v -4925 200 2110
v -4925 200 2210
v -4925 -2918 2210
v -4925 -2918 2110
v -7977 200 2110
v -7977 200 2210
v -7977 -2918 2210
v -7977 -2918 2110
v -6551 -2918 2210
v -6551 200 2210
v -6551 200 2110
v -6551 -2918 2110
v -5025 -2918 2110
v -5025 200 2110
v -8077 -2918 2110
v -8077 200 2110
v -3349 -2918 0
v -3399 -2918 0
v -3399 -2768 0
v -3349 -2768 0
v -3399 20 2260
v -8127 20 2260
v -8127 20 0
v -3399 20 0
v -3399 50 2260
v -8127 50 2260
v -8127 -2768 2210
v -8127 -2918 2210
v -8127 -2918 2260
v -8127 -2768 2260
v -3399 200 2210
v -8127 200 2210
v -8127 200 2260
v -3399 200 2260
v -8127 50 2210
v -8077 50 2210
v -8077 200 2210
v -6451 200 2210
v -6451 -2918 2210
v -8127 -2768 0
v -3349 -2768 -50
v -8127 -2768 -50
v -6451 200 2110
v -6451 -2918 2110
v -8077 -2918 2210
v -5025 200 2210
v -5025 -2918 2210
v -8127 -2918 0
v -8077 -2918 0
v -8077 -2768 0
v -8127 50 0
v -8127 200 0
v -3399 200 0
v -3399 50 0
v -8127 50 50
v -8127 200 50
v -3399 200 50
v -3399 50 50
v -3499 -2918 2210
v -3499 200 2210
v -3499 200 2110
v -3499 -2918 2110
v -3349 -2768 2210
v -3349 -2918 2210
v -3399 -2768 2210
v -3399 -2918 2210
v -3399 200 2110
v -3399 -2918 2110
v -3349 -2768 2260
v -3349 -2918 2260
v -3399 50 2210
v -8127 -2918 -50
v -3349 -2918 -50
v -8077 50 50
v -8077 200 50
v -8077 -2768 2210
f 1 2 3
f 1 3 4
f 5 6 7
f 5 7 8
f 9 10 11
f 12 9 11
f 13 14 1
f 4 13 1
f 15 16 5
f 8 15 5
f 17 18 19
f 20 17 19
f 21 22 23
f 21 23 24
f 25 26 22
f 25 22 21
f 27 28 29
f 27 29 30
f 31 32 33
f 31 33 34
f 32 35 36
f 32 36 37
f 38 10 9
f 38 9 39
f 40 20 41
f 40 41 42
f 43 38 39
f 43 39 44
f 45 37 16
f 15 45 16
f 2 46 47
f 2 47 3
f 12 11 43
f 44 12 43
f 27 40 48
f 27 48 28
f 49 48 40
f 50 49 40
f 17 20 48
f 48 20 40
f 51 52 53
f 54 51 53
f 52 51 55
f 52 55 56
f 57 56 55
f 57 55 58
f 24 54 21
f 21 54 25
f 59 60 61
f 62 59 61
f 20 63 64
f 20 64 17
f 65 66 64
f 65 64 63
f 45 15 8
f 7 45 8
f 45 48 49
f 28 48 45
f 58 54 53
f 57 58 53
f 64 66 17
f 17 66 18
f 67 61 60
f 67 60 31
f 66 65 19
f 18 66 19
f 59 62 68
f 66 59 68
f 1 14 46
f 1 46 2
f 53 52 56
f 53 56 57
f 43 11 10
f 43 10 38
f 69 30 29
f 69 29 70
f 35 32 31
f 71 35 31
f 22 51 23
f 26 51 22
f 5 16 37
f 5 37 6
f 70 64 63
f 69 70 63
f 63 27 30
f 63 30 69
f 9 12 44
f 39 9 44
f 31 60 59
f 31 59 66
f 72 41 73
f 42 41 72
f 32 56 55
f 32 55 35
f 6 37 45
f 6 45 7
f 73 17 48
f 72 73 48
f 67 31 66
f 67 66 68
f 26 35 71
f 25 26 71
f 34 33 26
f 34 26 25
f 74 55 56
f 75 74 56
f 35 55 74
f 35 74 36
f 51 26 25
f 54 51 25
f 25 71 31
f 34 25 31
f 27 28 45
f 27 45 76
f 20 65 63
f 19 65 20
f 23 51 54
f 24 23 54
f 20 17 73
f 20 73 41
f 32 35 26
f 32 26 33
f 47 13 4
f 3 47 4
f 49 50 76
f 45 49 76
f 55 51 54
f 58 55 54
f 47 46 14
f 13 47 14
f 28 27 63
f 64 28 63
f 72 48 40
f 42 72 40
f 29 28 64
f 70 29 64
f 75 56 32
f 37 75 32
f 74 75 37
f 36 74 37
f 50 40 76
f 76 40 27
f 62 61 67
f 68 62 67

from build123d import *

# Parameters (mm, degrees)
SKETCH_1_W        = 4728
SKETCH_1_H        = 150
EXTRUDE_1_DEPTH   = 50
EXTRUDE_START     = 2210
SKETCH_1_3_W      = 4728
SKETCH_1_3_H      = 150
EXTRUDE_2_DEPTH   = 50
SKETCH_2_W        = 100
SKETCH_2_H        = 100
EXTRUDE_3_DEPTH   = 3118
EXTRUDE_3_2_DEPTH = 3118
EXTRUDE_3_3_DEPTH = 3118
EXTRUDE_3_4_DEPTH = 3118
SKETCH_3_W        = 4778
SKETCH_3_H        = 150
EXTRUDE_4_DEPTH   = 50
SKETCH_4_W        = 2210
SKETCH_4_H        = 150
EXTRUDE_5_DEPTH   = 50
SKETCH_4_W_2      = 2160
EXTRUDE_5_2_DEPTH = 50
SKETCH_5_W        = 4778
SKETCH_5_H        = 150
EXTRUDE_6_DEPTH   = 50
SKETCH_6_W        = 2210
SKETCH_6_H        = 150
EXTRUDE_7_DEPTH   = 50
SKETCH_7_W        = 4728
SKETCH_7_H        = 2260
EXTRUDE_8_DEPTH   = 30


with BuildPart() as part:
    # Эскиз1 → Бобышка-Вытянуть1 (new body)
    with BuildSketch(Plane.XY):
        with Locations((-5763, 125)):
            Rectangle(SKETCH_1_W, SKETCH_1_H)
    extrude(amount=EXTRUDE_1_DEPTH)


with BuildPart() as body_2:
    # Эскиз1<3> → Бобышка-Вытянуть2 (new body)
    with BuildSketch(Plane.XY.offset(EXTRUDE_START)):
        with Locations((-5763, 125)):
            Rectangle(SKETCH_1_3_W, SKETCH_1_3_H)
    extrude(amount=EXTRUDE_2_DEPTH)


with BuildPart() as body_3:
    # Эскиз2 → Бобышка-Вытянуть3 (new body)
    with BuildSketch(Plane(origin=(0, 200, 0), x_dir=(1, 0, 0), z_dir=(0, 1, 0))):
        with Locations((-3449, -2160)):
            Rectangle(SKETCH_2_W, SKETCH_2_H)
    extrude(amount=-EXTRUDE_3_DEPTH)


with BuildPart() as body_4:
    # Эскиз2 → Extrude 3 2 (new body)
    with BuildSketch(Plane(origin=(0, 200, 0), x_dir=(1, 0, 0), z_dir=(0, 1, 0))):
        with Locations((-8027, -2160)):
            Rectangle(SKETCH_2_W, SKETCH_2_H)
    extrude(amount=-EXTRUDE_3_2_DEPTH)


with BuildPart() as body_5:
    # Эскиз2 → Extrude 3 3 (new body)
    with BuildSketch(Plane(origin=(0, 200, 0), x_dir=(1, 0, 0), z_dir=(0, 1, 0))):
        with Locations((-6501, -2160)):
            Rectangle(SKETCH_2_W, SKETCH_2_H)
    extrude(amount=-EXTRUDE_3_3_DEPTH)


with BuildPart() as body_6:
    # Эскиз2 → Extrude 3 4 (new body)
    with BuildSketch(Plane(origin=(0, 200, 0), x_dir=(1, 0, 0), z_dir=(0, 1, 0))):
        with Locations((-4975, -2160)):
            Rectangle(SKETCH_2_W, SKETCH_2_H)
    extrude(amount=-EXTRUDE_3_4_DEPTH)


with BuildPart() as body_7:
    # Эскиз3 → Бобышка-Вытянуть4 (new body)
    with BuildSketch(Plane.XY.offset(2210)):
        with Locations((-5738, -2843)):
            Rectangle(SKETCH_3_W, SKETCH_3_H)
    extrude(amount=EXTRUDE_4_DEPTH)


with BuildPart() as body_8:
    # Эскиз4 → Бобышка-Вытянуть5 (new body)
    with BuildSketch(Plane.ZY.offset(8127)):
        with Locations((1105, -2843)):
            Rectangle(SKETCH_4_W, SKETCH_4_H)
    extrude(amount=-EXTRUDE_5_DEPTH)


with BuildPart() as body_9:
    # Эскиз4 → Extrude 5 2 (new body)
    with BuildSketch(Plane.ZY.offset(8127)):
        with Locations((1130, 125)):
            Rectangle(SKETCH_4_W_2, SKETCH_4_H)
    extrude(amount=-EXTRUDE_5_2_DEPTH)


with BuildPart() as body_10:
    # Эскиз5 → Бобышка-Вытянуть6 (new body)
    with BuildSketch(Plane(origin=(0, 0, 0), x_dir=(-1, 0, 0), z_dir=(0, 0, -1))):
        with Locations((5738, -2843)):
            Rectangle(SKETCH_5_W, SKETCH_5_H)
    extrude(amount=EXTRUDE_6_DEPTH)


with BuildPart() as body_11:
    # Эскиз6 → Бобышка-Вытянуть7 (new body)
    with BuildSketch(Plane(origin=(-3399, 0, 0), x_dir=(0, 0, -1), z_dir=(1, 0, 0))):
        with Locations((-1105, -2843)):
            Rectangle(SKETCH_6_W, SKETCH_6_H)
    extrude(amount=EXTRUDE_7_DEPTH)


with BuildPart() as body_12:
    # Эскиз7 → Бобышка-Вытянуть8 (new body)
    with BuildSketch(Plane.XZ.offset(-50)):
        with Locations((-5763, 1130)):
            Rectangle(SKETCH_7_W, SKETCH_7_H)
    extrude(amount=EXTRUDE_8_DEPTH)


solid = Compound([part.part, body_2.part, body_3.part, body_4.part, body_5.part, body_6.part, body_7.part, body_8.part, body_9.part, body_10.part, body_11.part, body_12.part])
